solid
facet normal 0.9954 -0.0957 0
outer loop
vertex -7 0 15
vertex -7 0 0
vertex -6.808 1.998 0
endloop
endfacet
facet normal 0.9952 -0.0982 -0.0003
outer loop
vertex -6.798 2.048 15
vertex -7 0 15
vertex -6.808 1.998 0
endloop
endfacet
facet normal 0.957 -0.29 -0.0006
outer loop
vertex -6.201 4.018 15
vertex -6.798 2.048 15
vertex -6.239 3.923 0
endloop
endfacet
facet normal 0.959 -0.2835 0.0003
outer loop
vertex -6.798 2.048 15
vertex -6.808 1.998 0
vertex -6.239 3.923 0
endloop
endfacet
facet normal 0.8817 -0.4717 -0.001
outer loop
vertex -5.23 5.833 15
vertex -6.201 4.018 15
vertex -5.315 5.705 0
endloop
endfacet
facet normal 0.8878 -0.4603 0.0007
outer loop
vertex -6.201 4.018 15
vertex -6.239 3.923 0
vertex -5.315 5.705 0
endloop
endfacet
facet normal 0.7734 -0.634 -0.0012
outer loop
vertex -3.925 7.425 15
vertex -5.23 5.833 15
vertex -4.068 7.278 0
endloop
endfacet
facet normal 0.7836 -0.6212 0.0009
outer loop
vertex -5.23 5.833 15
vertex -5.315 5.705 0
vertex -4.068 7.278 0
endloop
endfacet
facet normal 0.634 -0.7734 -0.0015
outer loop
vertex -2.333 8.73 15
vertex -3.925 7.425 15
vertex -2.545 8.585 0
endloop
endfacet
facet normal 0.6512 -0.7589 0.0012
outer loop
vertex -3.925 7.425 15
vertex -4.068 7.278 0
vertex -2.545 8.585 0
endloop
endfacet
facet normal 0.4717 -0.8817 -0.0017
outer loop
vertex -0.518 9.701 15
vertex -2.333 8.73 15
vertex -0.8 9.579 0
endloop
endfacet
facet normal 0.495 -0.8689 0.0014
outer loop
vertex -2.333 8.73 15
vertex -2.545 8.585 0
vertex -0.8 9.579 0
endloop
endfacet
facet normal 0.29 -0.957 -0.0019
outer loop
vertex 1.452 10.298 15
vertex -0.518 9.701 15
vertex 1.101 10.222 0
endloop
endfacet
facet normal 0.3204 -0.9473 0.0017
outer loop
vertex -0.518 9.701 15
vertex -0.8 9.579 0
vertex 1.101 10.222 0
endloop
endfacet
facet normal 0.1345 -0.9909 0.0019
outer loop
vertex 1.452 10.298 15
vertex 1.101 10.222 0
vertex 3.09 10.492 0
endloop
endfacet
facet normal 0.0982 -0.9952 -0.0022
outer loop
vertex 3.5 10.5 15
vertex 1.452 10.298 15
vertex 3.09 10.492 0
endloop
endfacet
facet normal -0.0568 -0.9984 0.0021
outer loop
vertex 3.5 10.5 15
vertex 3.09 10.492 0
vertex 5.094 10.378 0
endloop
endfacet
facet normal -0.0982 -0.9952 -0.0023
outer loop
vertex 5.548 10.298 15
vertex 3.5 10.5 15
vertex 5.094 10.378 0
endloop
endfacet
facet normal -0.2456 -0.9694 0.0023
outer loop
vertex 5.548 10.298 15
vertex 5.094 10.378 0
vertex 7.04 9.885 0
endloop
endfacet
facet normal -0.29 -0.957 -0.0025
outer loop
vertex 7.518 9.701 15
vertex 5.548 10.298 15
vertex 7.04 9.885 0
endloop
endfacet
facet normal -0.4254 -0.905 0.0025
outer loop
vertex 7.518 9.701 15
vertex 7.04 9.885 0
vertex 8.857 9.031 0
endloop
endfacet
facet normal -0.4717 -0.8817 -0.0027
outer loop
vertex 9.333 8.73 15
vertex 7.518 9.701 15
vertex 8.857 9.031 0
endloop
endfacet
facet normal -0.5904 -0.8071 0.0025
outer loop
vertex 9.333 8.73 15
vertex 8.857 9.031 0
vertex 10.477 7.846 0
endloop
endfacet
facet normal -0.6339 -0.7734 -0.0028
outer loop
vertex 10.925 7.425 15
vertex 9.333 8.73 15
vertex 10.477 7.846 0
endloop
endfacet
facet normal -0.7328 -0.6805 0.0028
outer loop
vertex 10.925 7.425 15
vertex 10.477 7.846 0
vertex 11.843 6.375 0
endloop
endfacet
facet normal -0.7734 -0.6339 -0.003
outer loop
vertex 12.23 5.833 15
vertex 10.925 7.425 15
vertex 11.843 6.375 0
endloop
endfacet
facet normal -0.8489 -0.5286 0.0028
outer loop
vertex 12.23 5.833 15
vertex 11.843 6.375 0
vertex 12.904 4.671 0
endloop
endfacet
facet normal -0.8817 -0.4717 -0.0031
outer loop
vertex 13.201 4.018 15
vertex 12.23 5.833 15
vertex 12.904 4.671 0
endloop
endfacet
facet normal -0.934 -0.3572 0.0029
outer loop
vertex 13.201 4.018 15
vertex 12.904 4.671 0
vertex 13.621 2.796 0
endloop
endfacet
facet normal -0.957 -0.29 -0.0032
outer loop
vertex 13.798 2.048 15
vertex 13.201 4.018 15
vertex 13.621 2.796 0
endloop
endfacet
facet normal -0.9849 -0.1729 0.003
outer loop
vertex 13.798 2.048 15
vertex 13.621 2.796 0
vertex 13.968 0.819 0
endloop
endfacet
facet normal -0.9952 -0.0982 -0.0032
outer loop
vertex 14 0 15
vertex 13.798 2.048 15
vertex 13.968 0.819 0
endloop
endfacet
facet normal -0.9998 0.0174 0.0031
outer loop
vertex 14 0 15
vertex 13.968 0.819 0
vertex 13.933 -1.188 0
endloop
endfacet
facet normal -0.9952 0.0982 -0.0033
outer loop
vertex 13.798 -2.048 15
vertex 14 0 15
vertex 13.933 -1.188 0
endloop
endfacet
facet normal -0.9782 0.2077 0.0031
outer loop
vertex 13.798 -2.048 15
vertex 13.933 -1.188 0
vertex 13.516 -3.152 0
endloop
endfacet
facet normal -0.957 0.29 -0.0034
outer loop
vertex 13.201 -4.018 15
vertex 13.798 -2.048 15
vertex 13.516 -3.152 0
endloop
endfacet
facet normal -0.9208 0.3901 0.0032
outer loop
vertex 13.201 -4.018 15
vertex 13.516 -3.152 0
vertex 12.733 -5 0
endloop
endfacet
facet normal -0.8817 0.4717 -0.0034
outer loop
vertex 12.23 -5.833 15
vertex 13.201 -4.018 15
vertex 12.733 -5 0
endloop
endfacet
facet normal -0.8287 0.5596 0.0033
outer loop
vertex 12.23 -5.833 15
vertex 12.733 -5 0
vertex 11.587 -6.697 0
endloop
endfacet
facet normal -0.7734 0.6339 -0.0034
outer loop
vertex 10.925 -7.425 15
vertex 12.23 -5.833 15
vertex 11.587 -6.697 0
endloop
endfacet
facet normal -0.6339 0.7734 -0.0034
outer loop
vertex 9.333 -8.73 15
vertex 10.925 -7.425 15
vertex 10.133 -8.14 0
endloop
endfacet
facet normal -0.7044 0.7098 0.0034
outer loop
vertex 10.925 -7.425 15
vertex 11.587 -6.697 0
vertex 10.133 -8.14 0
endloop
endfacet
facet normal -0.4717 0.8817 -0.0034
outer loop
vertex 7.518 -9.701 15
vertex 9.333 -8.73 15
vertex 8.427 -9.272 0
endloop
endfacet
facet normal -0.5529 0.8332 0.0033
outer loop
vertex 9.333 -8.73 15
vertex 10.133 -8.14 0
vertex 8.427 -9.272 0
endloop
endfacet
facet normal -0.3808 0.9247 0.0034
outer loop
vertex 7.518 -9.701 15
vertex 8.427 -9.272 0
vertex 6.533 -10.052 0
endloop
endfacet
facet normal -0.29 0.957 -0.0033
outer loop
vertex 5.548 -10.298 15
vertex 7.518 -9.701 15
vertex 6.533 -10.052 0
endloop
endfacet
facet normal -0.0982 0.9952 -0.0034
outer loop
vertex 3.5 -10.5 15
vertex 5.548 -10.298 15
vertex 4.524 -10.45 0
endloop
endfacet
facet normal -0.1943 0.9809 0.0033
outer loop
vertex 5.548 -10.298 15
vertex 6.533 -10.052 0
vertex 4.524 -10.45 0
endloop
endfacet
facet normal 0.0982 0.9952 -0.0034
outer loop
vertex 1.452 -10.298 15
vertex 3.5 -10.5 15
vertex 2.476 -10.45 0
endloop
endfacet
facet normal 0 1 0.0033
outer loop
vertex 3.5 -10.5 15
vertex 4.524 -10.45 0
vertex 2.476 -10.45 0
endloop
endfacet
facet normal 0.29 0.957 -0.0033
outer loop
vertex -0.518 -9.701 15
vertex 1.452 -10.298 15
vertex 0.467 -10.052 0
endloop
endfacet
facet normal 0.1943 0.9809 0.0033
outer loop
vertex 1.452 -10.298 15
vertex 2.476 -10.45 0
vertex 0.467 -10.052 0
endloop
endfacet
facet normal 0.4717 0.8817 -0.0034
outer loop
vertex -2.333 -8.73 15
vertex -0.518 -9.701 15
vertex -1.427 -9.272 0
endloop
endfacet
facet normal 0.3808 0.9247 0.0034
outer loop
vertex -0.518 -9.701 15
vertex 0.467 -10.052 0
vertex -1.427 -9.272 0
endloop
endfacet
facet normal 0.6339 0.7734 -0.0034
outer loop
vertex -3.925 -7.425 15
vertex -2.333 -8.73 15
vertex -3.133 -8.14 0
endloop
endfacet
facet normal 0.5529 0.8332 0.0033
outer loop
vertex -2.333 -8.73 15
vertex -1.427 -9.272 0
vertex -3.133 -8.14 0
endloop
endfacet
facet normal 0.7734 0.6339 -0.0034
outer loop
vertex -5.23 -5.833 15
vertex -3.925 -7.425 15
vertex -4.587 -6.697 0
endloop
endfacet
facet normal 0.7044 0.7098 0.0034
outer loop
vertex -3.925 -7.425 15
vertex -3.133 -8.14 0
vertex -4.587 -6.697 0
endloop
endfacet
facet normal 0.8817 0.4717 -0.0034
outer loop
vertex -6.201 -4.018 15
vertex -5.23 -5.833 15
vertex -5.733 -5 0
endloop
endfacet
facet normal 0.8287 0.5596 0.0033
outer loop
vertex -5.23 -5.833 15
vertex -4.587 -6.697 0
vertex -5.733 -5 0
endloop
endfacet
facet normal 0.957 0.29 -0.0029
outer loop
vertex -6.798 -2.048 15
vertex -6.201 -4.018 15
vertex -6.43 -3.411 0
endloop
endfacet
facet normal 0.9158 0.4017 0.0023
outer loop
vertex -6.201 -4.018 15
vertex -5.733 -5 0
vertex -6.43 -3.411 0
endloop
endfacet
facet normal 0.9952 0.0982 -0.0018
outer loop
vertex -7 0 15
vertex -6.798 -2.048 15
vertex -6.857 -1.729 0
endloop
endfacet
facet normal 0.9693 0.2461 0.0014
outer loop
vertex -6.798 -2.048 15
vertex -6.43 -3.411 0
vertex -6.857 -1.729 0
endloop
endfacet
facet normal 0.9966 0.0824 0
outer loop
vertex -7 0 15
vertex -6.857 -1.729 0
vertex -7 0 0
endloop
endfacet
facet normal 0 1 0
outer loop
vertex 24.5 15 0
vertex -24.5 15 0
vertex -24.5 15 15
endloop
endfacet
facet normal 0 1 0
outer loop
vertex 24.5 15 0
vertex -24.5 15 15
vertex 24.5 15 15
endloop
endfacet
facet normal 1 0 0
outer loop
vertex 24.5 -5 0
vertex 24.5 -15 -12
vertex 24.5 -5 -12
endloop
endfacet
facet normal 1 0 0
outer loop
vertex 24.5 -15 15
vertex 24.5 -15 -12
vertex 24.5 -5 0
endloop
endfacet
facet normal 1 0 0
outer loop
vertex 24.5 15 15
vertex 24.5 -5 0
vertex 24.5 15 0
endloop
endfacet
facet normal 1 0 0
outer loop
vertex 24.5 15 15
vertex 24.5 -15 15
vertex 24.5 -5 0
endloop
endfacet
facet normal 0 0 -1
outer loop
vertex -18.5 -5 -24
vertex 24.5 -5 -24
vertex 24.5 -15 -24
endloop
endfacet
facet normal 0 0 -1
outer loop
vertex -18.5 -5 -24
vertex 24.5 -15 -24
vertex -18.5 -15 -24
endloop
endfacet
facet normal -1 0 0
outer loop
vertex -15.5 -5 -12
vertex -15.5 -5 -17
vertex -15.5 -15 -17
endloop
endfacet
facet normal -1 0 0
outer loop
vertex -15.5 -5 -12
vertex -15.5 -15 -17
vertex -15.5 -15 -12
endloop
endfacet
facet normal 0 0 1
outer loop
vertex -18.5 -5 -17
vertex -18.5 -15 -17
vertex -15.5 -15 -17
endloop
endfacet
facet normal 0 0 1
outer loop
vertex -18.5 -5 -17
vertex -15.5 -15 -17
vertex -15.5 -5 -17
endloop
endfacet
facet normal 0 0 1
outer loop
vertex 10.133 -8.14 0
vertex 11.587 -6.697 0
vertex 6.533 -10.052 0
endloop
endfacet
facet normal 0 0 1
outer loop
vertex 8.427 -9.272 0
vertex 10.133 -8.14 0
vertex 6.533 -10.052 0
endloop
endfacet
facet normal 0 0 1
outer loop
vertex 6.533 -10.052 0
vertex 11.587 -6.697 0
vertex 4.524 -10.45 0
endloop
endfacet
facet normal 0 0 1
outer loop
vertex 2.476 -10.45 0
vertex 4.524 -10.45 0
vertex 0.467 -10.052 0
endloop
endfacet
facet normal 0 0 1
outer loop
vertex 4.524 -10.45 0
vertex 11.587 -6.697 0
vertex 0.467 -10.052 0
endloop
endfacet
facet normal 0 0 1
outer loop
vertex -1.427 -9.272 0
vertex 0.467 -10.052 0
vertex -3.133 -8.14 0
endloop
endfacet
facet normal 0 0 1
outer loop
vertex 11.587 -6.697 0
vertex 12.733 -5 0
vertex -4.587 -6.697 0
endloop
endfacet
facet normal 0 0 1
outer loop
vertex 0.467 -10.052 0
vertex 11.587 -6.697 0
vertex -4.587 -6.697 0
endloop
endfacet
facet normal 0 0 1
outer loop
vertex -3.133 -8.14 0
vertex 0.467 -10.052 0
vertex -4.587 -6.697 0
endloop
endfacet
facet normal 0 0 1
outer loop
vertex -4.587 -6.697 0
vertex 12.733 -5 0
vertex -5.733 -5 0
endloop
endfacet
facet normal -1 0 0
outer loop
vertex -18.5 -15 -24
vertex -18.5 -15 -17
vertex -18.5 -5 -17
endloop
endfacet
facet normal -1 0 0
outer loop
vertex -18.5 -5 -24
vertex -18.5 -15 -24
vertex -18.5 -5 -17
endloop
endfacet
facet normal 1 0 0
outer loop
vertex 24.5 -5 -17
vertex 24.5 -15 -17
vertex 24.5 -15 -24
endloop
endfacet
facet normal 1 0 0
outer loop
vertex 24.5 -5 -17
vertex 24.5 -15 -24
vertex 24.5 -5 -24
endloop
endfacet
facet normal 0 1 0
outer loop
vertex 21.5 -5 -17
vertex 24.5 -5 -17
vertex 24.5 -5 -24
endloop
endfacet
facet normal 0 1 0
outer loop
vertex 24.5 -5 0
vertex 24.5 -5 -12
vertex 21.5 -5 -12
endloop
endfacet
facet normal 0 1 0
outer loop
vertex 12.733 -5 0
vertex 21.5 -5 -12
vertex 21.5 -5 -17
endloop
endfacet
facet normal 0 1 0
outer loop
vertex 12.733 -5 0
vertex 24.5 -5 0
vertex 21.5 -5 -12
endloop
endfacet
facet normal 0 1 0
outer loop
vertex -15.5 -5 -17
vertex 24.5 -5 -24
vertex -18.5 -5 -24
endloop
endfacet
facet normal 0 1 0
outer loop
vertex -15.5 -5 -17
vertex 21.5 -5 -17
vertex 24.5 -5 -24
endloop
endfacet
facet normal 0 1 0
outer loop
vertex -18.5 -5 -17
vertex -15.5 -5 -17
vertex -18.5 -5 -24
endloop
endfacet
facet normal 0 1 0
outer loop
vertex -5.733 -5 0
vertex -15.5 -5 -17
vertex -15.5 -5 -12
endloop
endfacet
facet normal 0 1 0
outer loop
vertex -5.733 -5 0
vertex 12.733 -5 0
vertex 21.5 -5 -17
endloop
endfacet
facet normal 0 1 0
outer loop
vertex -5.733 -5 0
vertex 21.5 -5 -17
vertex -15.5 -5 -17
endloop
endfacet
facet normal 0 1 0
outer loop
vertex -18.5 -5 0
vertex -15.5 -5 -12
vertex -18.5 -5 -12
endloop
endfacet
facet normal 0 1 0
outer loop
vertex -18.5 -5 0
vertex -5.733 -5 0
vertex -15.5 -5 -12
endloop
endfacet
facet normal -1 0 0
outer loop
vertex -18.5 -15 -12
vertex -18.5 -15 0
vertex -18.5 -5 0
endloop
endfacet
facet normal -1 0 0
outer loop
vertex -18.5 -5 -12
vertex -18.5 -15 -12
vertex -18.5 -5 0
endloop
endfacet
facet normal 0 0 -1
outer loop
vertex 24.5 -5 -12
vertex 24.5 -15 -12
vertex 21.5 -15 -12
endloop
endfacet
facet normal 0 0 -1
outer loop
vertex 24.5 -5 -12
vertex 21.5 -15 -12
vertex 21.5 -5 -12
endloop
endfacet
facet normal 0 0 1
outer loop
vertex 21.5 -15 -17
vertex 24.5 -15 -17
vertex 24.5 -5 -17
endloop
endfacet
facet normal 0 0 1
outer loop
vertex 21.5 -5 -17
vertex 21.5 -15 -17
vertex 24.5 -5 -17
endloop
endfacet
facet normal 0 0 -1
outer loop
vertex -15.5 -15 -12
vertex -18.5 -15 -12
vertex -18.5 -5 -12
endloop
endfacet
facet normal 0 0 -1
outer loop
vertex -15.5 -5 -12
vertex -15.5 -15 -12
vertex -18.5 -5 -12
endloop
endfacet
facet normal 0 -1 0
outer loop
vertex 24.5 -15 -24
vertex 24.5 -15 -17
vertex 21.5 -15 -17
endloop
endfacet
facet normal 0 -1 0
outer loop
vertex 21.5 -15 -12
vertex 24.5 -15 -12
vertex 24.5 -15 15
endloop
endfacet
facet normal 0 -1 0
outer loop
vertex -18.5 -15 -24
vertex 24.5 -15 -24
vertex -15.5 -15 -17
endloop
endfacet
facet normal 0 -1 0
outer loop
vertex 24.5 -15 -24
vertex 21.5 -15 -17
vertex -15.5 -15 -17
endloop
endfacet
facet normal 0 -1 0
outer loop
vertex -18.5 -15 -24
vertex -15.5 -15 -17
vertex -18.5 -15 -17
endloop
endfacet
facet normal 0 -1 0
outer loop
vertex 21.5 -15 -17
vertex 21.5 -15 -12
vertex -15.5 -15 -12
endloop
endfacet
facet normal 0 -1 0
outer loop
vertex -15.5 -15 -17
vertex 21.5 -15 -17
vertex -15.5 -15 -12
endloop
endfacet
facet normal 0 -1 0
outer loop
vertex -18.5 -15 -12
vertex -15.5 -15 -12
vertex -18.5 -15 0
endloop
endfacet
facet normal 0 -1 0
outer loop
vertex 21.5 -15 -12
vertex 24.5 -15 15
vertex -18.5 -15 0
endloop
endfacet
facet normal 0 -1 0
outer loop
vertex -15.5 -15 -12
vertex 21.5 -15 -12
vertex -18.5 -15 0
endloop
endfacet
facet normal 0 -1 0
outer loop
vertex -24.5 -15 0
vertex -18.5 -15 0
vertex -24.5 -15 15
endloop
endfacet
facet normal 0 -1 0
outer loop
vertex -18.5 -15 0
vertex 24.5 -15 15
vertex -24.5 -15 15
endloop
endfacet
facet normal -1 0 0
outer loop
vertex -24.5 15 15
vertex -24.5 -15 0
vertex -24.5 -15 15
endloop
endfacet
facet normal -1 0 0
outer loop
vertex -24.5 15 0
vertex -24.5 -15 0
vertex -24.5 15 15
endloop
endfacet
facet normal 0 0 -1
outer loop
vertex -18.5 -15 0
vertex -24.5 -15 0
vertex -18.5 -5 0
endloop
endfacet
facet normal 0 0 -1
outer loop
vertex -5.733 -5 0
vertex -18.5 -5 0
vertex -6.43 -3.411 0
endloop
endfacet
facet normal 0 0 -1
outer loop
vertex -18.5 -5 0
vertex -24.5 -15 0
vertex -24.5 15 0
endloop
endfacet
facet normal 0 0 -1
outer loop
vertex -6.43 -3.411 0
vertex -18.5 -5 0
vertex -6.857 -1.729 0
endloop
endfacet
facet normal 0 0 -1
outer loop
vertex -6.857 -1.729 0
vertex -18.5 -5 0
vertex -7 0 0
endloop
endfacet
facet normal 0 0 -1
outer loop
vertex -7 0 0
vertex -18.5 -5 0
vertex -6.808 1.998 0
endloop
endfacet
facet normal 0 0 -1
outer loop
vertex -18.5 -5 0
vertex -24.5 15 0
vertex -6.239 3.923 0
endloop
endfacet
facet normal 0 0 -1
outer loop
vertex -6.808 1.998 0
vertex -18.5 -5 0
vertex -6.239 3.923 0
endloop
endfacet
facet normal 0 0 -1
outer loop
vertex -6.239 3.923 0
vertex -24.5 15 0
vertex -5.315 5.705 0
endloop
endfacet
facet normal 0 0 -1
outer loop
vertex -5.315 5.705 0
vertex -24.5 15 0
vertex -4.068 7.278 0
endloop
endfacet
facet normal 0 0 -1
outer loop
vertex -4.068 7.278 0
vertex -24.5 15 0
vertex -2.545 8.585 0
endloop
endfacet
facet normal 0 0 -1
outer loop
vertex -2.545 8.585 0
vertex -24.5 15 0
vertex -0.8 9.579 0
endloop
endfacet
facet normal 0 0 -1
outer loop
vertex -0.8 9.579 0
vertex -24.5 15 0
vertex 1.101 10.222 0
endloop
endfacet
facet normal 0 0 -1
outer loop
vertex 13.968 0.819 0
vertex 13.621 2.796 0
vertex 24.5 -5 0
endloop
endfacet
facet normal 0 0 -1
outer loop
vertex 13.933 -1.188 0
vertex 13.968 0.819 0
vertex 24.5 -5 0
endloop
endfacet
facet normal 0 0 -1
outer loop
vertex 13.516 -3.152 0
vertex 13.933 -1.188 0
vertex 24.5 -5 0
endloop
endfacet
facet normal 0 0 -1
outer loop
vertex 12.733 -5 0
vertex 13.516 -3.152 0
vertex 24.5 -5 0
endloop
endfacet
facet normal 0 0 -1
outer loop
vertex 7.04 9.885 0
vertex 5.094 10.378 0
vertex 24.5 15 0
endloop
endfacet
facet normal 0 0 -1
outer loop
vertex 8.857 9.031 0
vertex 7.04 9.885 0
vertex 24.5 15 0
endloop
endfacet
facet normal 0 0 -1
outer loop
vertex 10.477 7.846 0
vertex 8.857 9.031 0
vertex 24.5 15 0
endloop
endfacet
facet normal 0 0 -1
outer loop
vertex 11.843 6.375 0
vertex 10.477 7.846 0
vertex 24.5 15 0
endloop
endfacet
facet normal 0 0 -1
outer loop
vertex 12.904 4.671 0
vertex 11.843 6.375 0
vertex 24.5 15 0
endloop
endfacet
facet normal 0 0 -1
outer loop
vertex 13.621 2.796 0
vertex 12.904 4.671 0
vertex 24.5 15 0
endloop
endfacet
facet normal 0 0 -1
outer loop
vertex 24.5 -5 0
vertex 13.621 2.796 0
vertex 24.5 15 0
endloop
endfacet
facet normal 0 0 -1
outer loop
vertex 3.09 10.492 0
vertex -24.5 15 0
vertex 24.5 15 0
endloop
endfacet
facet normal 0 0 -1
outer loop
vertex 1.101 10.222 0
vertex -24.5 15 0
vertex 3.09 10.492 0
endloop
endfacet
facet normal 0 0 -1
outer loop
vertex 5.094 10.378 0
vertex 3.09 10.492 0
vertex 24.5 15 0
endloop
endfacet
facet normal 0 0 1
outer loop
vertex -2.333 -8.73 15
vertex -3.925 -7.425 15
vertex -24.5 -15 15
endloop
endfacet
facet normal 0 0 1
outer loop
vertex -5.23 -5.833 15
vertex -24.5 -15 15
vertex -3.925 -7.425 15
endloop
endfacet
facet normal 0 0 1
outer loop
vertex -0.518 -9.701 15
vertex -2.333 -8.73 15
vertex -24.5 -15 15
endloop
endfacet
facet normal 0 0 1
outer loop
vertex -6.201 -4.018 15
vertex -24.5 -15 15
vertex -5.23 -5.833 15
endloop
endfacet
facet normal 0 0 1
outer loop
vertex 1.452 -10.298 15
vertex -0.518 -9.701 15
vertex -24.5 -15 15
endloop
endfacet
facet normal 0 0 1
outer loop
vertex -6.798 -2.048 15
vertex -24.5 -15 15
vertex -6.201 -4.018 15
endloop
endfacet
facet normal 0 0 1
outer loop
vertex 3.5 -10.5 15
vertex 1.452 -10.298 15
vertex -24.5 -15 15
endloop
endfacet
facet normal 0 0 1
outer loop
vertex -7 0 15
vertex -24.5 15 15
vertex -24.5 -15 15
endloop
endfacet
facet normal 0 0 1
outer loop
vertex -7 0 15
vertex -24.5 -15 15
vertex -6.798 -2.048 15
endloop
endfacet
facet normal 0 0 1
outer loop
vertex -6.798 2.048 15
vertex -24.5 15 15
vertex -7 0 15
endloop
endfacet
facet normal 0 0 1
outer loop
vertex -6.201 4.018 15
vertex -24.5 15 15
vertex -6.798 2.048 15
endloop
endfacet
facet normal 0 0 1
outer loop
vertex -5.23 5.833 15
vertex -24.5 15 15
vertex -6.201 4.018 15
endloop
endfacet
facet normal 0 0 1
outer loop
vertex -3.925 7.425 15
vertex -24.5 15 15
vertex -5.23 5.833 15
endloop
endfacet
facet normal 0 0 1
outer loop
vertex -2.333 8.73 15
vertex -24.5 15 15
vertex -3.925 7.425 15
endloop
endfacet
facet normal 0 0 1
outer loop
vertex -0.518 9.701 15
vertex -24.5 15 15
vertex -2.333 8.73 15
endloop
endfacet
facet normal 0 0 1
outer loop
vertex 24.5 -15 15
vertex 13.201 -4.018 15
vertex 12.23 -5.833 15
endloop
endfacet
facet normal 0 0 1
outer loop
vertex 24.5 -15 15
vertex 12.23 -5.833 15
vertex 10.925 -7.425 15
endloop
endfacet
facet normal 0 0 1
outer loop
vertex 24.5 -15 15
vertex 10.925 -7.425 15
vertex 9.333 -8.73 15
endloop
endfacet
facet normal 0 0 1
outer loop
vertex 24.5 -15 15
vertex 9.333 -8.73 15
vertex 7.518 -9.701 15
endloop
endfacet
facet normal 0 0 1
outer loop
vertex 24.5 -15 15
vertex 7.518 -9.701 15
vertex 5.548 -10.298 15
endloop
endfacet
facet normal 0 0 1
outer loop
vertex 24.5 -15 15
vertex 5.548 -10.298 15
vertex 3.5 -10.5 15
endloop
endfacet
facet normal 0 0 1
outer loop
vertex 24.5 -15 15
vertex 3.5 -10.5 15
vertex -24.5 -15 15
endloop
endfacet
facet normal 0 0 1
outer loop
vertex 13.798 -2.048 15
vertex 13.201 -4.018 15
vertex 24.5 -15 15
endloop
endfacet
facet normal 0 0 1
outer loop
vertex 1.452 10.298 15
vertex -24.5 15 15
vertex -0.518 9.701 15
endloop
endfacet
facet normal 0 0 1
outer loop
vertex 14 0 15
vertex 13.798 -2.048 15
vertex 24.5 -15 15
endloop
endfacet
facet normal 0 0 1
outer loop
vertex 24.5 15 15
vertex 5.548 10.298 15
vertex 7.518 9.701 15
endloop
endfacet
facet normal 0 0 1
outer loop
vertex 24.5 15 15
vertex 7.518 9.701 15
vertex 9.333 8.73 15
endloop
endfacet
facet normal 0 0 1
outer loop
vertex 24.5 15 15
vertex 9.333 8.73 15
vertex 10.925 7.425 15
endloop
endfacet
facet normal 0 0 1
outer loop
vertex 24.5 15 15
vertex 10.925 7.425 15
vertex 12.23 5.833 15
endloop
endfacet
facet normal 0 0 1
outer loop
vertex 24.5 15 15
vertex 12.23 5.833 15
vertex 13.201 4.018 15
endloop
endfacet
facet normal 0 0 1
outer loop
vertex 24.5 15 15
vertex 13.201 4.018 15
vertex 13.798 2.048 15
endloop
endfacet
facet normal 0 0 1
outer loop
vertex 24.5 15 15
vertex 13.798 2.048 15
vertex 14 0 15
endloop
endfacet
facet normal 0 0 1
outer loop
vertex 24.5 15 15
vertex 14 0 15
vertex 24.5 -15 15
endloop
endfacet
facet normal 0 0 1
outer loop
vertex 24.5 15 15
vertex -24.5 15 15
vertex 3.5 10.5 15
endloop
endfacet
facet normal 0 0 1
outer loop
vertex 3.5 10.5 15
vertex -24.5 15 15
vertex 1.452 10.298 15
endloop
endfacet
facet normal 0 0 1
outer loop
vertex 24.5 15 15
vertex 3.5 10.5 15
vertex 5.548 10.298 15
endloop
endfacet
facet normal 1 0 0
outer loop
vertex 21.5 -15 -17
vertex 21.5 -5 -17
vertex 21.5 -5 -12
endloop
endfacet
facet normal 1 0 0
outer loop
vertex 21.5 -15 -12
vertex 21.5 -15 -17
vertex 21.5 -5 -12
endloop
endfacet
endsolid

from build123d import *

# Parameters (mm, degrees)
SKETCH1_W           = 49
SKETCH1_H           = 30
BOSS_EXTRUDE1_DEPTH = 15
SKETCH3_R           = 10.5
CUT_EXTRUDE1_DEPTH  = 23
SKETCH4_W           = 43
SKETCH4_H           = 10
BOSS_EXTRUDE3_DEPTH = 24
SKETCH5_W           = 5
SKETCH5_H           = 10
CUT_EXTRUDE2_DEPTH  = 3


with BuildPart() as part:
    # Sketch1 → Boss-Extrude1 (new body)
    with BuildSketch(Plane.XY):
        Rectangle(SKETCH1_W, SKETCH1_H)
    extrude(amount=BOSS_EXTRUDE1_DEPTH)

    # Sketch3 → Cut-Extrude1 (cut)
    with BuildSketch(Plane(origin=(0, 0, 0), x_dir=(-1, 0, 0), z_dir=(0, 0, -1))):
        with Locations((-3.5, 0)):
            Circle(SKETCH3_R)
    extrude(amount=-CUT_EXTRUDE1_DEPTH, mode=Mode.SUBTRACT)

    # Sketch4 → Boss-Extrude3 (add)
    with BuildSketch(Plane(origin=(0, 0, 0), x_dir=(-1, 0, 0), z_dir=(0, 0, -1))):
        with Locations((-3, -10)):
            Rectangle(SKETCH4_W, SKETCH4_H)
    extrude(amount=BOSS_EXTRUDE3_DEPTH)

    # Sketch5 → Cut-Extrude2 (cut)
    with BuildSketch(Plane.ZY.offset(18.5)):
        with Locations((-14.5, -10)):
            Rectangle(SKETCH5_W, SKETCH5_H)
    cut_extrude2 = extrude(amount=-CUT_EXTRUDE2_DEPTH, mode=Mode.SUBTRACT)

    # Mirror1: Cut-Extrude2 across plane
    add(cut_extrude2.mirror(Plane.ZY.offset(-3)), mode=Mode.SUBTRACT)


solid = part.part
